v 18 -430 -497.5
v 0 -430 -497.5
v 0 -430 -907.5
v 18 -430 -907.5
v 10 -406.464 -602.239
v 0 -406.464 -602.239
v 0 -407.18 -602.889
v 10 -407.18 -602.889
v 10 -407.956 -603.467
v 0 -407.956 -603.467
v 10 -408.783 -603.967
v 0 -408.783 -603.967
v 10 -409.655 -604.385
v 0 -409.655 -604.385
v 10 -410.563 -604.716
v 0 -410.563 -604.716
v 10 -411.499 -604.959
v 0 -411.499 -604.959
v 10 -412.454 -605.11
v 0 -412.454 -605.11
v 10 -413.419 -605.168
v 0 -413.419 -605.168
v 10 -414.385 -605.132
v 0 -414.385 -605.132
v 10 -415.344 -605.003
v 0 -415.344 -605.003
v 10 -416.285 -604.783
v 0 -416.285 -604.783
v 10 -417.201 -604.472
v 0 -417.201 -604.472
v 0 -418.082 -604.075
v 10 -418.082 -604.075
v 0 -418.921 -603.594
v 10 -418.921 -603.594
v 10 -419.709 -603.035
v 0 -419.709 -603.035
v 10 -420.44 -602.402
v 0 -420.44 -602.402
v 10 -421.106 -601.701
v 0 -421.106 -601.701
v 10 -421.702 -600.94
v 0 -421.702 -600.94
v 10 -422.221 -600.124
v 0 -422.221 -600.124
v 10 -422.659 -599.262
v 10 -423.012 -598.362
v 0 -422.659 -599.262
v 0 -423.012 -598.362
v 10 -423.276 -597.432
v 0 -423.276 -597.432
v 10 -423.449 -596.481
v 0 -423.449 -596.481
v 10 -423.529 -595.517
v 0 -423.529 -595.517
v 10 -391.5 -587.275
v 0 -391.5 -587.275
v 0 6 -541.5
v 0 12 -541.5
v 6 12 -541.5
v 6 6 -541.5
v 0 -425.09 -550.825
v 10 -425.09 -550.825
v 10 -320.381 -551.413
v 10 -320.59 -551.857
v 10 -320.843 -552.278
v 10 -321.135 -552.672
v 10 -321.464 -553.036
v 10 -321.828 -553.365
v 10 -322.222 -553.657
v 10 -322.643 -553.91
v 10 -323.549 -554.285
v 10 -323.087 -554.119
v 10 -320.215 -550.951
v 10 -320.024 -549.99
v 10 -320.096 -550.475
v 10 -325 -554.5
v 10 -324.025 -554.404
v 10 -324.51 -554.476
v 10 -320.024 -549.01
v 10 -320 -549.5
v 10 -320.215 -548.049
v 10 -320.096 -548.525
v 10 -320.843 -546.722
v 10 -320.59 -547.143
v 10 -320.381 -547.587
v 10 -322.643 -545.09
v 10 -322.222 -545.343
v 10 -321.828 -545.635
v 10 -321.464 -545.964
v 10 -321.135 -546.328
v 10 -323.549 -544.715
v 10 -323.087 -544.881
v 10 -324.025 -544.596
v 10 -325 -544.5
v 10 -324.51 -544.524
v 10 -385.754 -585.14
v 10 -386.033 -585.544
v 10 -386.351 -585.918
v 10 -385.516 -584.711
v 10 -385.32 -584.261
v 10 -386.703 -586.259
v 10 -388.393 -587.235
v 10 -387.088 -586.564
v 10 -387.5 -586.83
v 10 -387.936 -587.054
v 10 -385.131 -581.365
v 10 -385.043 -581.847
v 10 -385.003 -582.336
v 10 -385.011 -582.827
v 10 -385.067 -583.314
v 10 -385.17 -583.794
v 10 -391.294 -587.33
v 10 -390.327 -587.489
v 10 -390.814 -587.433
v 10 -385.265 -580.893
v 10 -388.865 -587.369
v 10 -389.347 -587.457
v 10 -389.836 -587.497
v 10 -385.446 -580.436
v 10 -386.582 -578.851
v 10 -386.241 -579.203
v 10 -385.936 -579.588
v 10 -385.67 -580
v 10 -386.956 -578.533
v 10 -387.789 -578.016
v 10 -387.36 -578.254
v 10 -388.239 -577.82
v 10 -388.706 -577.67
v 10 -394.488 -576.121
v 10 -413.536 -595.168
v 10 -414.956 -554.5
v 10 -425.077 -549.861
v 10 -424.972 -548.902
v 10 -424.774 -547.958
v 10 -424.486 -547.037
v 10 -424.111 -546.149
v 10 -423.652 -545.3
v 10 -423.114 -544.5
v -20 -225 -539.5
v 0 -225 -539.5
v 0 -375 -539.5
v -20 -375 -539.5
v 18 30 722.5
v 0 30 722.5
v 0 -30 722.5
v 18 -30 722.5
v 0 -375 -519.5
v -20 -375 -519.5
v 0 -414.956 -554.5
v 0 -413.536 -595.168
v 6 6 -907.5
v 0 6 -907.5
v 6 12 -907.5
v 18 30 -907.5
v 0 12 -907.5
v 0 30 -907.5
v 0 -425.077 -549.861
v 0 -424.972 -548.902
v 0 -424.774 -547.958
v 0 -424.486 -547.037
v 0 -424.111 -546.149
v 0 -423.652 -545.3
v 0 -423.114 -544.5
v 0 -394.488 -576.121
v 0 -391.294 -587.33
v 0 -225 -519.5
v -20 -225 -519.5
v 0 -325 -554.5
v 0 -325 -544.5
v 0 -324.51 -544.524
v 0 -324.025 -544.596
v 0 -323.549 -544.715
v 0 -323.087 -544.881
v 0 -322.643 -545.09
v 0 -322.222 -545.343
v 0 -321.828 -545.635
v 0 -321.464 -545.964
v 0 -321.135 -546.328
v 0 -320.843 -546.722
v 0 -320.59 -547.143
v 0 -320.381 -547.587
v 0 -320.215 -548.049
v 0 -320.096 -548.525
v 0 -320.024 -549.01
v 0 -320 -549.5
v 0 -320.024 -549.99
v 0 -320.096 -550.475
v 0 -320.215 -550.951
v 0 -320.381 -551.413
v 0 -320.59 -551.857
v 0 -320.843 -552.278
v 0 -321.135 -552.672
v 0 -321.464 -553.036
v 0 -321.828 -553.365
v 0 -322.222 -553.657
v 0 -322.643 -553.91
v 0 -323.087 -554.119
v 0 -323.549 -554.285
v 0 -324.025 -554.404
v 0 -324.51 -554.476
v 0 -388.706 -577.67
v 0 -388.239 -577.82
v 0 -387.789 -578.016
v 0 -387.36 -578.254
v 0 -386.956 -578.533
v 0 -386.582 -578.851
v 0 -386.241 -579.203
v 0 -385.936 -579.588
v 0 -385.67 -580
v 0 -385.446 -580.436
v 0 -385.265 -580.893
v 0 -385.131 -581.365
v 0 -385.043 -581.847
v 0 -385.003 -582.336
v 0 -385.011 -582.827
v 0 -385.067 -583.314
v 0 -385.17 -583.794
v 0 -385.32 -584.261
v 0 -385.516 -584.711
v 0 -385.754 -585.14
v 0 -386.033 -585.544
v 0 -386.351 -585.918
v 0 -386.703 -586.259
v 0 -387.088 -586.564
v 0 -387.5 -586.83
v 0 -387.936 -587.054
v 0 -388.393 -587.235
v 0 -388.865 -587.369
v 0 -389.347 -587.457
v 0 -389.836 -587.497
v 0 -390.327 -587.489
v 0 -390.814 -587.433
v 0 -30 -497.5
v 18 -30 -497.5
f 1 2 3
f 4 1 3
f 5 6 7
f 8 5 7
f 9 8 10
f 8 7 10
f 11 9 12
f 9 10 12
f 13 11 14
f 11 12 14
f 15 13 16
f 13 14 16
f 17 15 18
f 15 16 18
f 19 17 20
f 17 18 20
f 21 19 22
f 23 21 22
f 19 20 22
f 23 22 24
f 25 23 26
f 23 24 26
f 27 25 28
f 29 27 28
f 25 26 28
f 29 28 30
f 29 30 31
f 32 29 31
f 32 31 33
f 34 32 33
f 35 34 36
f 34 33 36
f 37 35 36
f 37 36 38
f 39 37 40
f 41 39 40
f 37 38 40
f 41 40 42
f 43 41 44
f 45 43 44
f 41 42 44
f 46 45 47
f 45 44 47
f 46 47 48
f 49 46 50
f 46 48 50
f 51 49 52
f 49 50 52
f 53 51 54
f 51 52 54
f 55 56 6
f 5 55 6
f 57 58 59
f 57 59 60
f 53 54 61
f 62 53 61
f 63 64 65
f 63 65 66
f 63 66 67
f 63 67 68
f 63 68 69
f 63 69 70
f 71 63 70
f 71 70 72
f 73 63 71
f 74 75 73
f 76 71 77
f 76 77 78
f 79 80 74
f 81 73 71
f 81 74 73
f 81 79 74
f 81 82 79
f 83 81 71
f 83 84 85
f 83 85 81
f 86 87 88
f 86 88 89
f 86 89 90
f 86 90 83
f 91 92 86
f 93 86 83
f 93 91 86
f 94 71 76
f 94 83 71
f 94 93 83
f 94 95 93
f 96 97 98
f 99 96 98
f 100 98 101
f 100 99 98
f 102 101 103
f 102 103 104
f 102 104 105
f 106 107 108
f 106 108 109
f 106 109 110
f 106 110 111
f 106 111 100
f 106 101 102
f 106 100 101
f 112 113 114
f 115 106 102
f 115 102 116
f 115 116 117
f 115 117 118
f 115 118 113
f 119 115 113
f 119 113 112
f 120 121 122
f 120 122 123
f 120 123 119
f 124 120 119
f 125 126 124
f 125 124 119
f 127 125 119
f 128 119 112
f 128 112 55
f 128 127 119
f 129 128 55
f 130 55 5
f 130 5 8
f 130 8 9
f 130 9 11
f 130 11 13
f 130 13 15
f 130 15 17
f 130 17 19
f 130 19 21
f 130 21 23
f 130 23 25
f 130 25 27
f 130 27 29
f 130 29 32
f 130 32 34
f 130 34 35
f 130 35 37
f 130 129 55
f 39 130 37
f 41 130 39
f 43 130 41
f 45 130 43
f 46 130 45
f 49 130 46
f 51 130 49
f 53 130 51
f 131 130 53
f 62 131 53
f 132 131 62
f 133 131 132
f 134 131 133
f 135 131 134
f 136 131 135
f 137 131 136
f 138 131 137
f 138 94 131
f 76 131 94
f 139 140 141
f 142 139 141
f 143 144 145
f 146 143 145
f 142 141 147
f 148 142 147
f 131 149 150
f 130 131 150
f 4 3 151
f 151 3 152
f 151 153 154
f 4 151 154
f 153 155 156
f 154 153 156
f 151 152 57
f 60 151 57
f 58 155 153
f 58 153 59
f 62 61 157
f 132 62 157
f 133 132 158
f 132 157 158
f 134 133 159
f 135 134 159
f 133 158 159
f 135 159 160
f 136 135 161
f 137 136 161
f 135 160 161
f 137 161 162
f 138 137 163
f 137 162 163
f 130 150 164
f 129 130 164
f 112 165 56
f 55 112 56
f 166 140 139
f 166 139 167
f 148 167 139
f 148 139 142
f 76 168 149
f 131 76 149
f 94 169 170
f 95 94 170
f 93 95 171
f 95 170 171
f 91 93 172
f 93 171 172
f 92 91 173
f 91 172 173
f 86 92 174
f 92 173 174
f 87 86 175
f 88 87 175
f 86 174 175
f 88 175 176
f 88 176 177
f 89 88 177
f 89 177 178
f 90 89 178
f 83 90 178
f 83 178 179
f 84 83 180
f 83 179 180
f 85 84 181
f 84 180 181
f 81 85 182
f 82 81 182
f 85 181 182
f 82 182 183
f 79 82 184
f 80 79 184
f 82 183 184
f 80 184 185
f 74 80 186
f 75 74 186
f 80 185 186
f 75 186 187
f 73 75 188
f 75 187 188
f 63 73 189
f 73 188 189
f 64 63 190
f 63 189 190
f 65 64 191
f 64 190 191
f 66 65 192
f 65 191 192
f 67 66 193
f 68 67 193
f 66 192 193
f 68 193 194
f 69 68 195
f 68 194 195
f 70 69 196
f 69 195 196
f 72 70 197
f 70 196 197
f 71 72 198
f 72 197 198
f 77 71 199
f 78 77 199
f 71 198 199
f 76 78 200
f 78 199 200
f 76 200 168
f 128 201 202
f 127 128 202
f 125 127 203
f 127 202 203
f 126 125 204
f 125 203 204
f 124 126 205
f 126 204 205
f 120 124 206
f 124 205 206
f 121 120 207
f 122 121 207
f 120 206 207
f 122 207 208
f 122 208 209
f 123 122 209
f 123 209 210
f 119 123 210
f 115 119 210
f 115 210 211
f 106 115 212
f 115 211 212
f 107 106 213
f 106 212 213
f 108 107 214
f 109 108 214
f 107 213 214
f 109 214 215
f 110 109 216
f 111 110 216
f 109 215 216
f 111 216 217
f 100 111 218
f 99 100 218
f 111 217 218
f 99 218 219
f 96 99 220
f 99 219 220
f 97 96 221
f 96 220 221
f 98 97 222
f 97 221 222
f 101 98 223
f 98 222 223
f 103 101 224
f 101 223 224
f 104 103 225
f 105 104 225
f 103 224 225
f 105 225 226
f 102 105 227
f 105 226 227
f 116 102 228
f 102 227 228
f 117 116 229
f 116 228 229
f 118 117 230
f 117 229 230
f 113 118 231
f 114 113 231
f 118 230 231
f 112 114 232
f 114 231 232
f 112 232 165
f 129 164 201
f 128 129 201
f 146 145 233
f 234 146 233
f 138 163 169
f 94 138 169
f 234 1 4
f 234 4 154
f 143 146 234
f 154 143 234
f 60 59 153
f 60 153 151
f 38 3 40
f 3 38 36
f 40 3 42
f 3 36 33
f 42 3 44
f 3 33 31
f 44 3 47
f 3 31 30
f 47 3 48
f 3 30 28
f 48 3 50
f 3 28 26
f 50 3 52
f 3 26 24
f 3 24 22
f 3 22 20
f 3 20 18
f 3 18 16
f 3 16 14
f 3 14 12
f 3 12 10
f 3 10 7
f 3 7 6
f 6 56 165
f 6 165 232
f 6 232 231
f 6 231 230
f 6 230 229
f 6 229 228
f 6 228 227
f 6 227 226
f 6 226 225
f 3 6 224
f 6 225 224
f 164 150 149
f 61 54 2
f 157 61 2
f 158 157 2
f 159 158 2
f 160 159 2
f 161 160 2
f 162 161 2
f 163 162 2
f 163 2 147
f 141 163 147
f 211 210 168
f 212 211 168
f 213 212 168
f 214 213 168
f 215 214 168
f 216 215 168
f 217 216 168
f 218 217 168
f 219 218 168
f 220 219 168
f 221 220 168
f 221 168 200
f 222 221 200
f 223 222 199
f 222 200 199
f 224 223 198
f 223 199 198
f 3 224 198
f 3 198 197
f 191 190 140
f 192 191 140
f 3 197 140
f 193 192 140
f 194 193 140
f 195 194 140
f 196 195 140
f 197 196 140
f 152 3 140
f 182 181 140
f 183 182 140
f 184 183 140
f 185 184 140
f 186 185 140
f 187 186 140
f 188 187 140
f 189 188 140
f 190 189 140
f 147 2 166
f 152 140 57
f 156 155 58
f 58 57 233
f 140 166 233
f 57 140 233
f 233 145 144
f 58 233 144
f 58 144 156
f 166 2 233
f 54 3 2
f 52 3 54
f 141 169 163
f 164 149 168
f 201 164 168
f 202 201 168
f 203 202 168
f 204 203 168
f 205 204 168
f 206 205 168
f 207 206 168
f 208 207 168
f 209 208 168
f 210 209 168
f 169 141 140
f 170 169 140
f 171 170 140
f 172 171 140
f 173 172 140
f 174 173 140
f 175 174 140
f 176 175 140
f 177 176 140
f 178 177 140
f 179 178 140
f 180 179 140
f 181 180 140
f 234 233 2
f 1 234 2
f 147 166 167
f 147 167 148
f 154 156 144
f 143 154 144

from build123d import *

# Parameters (mm, degrees)
F1_DEPTH = 18
F2_W     = 6
F2_H     = 366
F3_DEPTH = 6
F5_DEPTH = 10
F6_W     = 150
F6_H     = 20
F7_DEPTH = 20


with BuildPart() as f1:
    # F0 (on Right) → F1 (new body)
    with BuildSketch(Plane.YZ):
        Polygon((30, -907.5), (30, 722.5), (-30, 722.5), (-30, -497.5), (-430, -497.5), (-430, -907.5), align=None)
    extrude(amount=F1_DEPTH)

    # F2 (on face) → F3 (cut)
    with BuildSketch(Plane(origin=(0, 0, 0), x_dir=(0, -1, 0), z_dir=(-1, 0, 0))):
        with Locations((-9, -724.5)):
            Rectangle(F2_W, F2_H)
    extrude(amount=-F3_DEPTH, mode=Mode.SUBTRACT)

    # F4 (on face) → F5 (cut)
    with BuildSketch(Plane(origin=(0, 0, 0), x_dir=(0, -1, 0), z_dir=(-1, 0, 0))):
        with BuildLine():
            Line((394.488256, -576.120995), (388.705905, -577.670371))
            ThreePointArc((388.705905, -577.670371), (385.170371, -583.794095), (391.294095, -587.329629))
            Line((391.294095, -587.329629), (391.499671, -587.274545))
            Line((391.499671, -587.274545), (406.464466, -602.23934))
            ThreePointArc((406.464466, -602.23934), (417.200546, -604.472448), (423.529442, -595.517267))
            Line((423.529442, -595.517267), (425.090125, -550.825165))
            ThreePointArc((425.090125, -550.825165), (424.641241, -547.494139), (423.114034, -544.5))
            Line((423.114034, -544.5), (325, -544.5))
            ThreePointArc((325, -544.5), (320, -549.5), (325, -554.5))
            Line((325, -554.5), (414.955701, -554.5))
            Line((414.955701, -554.5), (413.535534, -595.168272))
            Line((413.535534, -595.168272), (394.488256, -576.120995))
        make_face()
    extrude(amount=-F5_DEPTH, mode=Mode.SUBTRACT)

    # F6 (on face) → F7 (join)
    with BuildSketch(Plane(origin=(0, 0, 0), x_dir=(0, -1, 0), z_dir=(-1, 0, 0))):
        with Locations((300, -529.5)):
            Rectangle(F6_W, F6_H)
    extrude(amount=F7_DEPTH)


solid = f1.part
